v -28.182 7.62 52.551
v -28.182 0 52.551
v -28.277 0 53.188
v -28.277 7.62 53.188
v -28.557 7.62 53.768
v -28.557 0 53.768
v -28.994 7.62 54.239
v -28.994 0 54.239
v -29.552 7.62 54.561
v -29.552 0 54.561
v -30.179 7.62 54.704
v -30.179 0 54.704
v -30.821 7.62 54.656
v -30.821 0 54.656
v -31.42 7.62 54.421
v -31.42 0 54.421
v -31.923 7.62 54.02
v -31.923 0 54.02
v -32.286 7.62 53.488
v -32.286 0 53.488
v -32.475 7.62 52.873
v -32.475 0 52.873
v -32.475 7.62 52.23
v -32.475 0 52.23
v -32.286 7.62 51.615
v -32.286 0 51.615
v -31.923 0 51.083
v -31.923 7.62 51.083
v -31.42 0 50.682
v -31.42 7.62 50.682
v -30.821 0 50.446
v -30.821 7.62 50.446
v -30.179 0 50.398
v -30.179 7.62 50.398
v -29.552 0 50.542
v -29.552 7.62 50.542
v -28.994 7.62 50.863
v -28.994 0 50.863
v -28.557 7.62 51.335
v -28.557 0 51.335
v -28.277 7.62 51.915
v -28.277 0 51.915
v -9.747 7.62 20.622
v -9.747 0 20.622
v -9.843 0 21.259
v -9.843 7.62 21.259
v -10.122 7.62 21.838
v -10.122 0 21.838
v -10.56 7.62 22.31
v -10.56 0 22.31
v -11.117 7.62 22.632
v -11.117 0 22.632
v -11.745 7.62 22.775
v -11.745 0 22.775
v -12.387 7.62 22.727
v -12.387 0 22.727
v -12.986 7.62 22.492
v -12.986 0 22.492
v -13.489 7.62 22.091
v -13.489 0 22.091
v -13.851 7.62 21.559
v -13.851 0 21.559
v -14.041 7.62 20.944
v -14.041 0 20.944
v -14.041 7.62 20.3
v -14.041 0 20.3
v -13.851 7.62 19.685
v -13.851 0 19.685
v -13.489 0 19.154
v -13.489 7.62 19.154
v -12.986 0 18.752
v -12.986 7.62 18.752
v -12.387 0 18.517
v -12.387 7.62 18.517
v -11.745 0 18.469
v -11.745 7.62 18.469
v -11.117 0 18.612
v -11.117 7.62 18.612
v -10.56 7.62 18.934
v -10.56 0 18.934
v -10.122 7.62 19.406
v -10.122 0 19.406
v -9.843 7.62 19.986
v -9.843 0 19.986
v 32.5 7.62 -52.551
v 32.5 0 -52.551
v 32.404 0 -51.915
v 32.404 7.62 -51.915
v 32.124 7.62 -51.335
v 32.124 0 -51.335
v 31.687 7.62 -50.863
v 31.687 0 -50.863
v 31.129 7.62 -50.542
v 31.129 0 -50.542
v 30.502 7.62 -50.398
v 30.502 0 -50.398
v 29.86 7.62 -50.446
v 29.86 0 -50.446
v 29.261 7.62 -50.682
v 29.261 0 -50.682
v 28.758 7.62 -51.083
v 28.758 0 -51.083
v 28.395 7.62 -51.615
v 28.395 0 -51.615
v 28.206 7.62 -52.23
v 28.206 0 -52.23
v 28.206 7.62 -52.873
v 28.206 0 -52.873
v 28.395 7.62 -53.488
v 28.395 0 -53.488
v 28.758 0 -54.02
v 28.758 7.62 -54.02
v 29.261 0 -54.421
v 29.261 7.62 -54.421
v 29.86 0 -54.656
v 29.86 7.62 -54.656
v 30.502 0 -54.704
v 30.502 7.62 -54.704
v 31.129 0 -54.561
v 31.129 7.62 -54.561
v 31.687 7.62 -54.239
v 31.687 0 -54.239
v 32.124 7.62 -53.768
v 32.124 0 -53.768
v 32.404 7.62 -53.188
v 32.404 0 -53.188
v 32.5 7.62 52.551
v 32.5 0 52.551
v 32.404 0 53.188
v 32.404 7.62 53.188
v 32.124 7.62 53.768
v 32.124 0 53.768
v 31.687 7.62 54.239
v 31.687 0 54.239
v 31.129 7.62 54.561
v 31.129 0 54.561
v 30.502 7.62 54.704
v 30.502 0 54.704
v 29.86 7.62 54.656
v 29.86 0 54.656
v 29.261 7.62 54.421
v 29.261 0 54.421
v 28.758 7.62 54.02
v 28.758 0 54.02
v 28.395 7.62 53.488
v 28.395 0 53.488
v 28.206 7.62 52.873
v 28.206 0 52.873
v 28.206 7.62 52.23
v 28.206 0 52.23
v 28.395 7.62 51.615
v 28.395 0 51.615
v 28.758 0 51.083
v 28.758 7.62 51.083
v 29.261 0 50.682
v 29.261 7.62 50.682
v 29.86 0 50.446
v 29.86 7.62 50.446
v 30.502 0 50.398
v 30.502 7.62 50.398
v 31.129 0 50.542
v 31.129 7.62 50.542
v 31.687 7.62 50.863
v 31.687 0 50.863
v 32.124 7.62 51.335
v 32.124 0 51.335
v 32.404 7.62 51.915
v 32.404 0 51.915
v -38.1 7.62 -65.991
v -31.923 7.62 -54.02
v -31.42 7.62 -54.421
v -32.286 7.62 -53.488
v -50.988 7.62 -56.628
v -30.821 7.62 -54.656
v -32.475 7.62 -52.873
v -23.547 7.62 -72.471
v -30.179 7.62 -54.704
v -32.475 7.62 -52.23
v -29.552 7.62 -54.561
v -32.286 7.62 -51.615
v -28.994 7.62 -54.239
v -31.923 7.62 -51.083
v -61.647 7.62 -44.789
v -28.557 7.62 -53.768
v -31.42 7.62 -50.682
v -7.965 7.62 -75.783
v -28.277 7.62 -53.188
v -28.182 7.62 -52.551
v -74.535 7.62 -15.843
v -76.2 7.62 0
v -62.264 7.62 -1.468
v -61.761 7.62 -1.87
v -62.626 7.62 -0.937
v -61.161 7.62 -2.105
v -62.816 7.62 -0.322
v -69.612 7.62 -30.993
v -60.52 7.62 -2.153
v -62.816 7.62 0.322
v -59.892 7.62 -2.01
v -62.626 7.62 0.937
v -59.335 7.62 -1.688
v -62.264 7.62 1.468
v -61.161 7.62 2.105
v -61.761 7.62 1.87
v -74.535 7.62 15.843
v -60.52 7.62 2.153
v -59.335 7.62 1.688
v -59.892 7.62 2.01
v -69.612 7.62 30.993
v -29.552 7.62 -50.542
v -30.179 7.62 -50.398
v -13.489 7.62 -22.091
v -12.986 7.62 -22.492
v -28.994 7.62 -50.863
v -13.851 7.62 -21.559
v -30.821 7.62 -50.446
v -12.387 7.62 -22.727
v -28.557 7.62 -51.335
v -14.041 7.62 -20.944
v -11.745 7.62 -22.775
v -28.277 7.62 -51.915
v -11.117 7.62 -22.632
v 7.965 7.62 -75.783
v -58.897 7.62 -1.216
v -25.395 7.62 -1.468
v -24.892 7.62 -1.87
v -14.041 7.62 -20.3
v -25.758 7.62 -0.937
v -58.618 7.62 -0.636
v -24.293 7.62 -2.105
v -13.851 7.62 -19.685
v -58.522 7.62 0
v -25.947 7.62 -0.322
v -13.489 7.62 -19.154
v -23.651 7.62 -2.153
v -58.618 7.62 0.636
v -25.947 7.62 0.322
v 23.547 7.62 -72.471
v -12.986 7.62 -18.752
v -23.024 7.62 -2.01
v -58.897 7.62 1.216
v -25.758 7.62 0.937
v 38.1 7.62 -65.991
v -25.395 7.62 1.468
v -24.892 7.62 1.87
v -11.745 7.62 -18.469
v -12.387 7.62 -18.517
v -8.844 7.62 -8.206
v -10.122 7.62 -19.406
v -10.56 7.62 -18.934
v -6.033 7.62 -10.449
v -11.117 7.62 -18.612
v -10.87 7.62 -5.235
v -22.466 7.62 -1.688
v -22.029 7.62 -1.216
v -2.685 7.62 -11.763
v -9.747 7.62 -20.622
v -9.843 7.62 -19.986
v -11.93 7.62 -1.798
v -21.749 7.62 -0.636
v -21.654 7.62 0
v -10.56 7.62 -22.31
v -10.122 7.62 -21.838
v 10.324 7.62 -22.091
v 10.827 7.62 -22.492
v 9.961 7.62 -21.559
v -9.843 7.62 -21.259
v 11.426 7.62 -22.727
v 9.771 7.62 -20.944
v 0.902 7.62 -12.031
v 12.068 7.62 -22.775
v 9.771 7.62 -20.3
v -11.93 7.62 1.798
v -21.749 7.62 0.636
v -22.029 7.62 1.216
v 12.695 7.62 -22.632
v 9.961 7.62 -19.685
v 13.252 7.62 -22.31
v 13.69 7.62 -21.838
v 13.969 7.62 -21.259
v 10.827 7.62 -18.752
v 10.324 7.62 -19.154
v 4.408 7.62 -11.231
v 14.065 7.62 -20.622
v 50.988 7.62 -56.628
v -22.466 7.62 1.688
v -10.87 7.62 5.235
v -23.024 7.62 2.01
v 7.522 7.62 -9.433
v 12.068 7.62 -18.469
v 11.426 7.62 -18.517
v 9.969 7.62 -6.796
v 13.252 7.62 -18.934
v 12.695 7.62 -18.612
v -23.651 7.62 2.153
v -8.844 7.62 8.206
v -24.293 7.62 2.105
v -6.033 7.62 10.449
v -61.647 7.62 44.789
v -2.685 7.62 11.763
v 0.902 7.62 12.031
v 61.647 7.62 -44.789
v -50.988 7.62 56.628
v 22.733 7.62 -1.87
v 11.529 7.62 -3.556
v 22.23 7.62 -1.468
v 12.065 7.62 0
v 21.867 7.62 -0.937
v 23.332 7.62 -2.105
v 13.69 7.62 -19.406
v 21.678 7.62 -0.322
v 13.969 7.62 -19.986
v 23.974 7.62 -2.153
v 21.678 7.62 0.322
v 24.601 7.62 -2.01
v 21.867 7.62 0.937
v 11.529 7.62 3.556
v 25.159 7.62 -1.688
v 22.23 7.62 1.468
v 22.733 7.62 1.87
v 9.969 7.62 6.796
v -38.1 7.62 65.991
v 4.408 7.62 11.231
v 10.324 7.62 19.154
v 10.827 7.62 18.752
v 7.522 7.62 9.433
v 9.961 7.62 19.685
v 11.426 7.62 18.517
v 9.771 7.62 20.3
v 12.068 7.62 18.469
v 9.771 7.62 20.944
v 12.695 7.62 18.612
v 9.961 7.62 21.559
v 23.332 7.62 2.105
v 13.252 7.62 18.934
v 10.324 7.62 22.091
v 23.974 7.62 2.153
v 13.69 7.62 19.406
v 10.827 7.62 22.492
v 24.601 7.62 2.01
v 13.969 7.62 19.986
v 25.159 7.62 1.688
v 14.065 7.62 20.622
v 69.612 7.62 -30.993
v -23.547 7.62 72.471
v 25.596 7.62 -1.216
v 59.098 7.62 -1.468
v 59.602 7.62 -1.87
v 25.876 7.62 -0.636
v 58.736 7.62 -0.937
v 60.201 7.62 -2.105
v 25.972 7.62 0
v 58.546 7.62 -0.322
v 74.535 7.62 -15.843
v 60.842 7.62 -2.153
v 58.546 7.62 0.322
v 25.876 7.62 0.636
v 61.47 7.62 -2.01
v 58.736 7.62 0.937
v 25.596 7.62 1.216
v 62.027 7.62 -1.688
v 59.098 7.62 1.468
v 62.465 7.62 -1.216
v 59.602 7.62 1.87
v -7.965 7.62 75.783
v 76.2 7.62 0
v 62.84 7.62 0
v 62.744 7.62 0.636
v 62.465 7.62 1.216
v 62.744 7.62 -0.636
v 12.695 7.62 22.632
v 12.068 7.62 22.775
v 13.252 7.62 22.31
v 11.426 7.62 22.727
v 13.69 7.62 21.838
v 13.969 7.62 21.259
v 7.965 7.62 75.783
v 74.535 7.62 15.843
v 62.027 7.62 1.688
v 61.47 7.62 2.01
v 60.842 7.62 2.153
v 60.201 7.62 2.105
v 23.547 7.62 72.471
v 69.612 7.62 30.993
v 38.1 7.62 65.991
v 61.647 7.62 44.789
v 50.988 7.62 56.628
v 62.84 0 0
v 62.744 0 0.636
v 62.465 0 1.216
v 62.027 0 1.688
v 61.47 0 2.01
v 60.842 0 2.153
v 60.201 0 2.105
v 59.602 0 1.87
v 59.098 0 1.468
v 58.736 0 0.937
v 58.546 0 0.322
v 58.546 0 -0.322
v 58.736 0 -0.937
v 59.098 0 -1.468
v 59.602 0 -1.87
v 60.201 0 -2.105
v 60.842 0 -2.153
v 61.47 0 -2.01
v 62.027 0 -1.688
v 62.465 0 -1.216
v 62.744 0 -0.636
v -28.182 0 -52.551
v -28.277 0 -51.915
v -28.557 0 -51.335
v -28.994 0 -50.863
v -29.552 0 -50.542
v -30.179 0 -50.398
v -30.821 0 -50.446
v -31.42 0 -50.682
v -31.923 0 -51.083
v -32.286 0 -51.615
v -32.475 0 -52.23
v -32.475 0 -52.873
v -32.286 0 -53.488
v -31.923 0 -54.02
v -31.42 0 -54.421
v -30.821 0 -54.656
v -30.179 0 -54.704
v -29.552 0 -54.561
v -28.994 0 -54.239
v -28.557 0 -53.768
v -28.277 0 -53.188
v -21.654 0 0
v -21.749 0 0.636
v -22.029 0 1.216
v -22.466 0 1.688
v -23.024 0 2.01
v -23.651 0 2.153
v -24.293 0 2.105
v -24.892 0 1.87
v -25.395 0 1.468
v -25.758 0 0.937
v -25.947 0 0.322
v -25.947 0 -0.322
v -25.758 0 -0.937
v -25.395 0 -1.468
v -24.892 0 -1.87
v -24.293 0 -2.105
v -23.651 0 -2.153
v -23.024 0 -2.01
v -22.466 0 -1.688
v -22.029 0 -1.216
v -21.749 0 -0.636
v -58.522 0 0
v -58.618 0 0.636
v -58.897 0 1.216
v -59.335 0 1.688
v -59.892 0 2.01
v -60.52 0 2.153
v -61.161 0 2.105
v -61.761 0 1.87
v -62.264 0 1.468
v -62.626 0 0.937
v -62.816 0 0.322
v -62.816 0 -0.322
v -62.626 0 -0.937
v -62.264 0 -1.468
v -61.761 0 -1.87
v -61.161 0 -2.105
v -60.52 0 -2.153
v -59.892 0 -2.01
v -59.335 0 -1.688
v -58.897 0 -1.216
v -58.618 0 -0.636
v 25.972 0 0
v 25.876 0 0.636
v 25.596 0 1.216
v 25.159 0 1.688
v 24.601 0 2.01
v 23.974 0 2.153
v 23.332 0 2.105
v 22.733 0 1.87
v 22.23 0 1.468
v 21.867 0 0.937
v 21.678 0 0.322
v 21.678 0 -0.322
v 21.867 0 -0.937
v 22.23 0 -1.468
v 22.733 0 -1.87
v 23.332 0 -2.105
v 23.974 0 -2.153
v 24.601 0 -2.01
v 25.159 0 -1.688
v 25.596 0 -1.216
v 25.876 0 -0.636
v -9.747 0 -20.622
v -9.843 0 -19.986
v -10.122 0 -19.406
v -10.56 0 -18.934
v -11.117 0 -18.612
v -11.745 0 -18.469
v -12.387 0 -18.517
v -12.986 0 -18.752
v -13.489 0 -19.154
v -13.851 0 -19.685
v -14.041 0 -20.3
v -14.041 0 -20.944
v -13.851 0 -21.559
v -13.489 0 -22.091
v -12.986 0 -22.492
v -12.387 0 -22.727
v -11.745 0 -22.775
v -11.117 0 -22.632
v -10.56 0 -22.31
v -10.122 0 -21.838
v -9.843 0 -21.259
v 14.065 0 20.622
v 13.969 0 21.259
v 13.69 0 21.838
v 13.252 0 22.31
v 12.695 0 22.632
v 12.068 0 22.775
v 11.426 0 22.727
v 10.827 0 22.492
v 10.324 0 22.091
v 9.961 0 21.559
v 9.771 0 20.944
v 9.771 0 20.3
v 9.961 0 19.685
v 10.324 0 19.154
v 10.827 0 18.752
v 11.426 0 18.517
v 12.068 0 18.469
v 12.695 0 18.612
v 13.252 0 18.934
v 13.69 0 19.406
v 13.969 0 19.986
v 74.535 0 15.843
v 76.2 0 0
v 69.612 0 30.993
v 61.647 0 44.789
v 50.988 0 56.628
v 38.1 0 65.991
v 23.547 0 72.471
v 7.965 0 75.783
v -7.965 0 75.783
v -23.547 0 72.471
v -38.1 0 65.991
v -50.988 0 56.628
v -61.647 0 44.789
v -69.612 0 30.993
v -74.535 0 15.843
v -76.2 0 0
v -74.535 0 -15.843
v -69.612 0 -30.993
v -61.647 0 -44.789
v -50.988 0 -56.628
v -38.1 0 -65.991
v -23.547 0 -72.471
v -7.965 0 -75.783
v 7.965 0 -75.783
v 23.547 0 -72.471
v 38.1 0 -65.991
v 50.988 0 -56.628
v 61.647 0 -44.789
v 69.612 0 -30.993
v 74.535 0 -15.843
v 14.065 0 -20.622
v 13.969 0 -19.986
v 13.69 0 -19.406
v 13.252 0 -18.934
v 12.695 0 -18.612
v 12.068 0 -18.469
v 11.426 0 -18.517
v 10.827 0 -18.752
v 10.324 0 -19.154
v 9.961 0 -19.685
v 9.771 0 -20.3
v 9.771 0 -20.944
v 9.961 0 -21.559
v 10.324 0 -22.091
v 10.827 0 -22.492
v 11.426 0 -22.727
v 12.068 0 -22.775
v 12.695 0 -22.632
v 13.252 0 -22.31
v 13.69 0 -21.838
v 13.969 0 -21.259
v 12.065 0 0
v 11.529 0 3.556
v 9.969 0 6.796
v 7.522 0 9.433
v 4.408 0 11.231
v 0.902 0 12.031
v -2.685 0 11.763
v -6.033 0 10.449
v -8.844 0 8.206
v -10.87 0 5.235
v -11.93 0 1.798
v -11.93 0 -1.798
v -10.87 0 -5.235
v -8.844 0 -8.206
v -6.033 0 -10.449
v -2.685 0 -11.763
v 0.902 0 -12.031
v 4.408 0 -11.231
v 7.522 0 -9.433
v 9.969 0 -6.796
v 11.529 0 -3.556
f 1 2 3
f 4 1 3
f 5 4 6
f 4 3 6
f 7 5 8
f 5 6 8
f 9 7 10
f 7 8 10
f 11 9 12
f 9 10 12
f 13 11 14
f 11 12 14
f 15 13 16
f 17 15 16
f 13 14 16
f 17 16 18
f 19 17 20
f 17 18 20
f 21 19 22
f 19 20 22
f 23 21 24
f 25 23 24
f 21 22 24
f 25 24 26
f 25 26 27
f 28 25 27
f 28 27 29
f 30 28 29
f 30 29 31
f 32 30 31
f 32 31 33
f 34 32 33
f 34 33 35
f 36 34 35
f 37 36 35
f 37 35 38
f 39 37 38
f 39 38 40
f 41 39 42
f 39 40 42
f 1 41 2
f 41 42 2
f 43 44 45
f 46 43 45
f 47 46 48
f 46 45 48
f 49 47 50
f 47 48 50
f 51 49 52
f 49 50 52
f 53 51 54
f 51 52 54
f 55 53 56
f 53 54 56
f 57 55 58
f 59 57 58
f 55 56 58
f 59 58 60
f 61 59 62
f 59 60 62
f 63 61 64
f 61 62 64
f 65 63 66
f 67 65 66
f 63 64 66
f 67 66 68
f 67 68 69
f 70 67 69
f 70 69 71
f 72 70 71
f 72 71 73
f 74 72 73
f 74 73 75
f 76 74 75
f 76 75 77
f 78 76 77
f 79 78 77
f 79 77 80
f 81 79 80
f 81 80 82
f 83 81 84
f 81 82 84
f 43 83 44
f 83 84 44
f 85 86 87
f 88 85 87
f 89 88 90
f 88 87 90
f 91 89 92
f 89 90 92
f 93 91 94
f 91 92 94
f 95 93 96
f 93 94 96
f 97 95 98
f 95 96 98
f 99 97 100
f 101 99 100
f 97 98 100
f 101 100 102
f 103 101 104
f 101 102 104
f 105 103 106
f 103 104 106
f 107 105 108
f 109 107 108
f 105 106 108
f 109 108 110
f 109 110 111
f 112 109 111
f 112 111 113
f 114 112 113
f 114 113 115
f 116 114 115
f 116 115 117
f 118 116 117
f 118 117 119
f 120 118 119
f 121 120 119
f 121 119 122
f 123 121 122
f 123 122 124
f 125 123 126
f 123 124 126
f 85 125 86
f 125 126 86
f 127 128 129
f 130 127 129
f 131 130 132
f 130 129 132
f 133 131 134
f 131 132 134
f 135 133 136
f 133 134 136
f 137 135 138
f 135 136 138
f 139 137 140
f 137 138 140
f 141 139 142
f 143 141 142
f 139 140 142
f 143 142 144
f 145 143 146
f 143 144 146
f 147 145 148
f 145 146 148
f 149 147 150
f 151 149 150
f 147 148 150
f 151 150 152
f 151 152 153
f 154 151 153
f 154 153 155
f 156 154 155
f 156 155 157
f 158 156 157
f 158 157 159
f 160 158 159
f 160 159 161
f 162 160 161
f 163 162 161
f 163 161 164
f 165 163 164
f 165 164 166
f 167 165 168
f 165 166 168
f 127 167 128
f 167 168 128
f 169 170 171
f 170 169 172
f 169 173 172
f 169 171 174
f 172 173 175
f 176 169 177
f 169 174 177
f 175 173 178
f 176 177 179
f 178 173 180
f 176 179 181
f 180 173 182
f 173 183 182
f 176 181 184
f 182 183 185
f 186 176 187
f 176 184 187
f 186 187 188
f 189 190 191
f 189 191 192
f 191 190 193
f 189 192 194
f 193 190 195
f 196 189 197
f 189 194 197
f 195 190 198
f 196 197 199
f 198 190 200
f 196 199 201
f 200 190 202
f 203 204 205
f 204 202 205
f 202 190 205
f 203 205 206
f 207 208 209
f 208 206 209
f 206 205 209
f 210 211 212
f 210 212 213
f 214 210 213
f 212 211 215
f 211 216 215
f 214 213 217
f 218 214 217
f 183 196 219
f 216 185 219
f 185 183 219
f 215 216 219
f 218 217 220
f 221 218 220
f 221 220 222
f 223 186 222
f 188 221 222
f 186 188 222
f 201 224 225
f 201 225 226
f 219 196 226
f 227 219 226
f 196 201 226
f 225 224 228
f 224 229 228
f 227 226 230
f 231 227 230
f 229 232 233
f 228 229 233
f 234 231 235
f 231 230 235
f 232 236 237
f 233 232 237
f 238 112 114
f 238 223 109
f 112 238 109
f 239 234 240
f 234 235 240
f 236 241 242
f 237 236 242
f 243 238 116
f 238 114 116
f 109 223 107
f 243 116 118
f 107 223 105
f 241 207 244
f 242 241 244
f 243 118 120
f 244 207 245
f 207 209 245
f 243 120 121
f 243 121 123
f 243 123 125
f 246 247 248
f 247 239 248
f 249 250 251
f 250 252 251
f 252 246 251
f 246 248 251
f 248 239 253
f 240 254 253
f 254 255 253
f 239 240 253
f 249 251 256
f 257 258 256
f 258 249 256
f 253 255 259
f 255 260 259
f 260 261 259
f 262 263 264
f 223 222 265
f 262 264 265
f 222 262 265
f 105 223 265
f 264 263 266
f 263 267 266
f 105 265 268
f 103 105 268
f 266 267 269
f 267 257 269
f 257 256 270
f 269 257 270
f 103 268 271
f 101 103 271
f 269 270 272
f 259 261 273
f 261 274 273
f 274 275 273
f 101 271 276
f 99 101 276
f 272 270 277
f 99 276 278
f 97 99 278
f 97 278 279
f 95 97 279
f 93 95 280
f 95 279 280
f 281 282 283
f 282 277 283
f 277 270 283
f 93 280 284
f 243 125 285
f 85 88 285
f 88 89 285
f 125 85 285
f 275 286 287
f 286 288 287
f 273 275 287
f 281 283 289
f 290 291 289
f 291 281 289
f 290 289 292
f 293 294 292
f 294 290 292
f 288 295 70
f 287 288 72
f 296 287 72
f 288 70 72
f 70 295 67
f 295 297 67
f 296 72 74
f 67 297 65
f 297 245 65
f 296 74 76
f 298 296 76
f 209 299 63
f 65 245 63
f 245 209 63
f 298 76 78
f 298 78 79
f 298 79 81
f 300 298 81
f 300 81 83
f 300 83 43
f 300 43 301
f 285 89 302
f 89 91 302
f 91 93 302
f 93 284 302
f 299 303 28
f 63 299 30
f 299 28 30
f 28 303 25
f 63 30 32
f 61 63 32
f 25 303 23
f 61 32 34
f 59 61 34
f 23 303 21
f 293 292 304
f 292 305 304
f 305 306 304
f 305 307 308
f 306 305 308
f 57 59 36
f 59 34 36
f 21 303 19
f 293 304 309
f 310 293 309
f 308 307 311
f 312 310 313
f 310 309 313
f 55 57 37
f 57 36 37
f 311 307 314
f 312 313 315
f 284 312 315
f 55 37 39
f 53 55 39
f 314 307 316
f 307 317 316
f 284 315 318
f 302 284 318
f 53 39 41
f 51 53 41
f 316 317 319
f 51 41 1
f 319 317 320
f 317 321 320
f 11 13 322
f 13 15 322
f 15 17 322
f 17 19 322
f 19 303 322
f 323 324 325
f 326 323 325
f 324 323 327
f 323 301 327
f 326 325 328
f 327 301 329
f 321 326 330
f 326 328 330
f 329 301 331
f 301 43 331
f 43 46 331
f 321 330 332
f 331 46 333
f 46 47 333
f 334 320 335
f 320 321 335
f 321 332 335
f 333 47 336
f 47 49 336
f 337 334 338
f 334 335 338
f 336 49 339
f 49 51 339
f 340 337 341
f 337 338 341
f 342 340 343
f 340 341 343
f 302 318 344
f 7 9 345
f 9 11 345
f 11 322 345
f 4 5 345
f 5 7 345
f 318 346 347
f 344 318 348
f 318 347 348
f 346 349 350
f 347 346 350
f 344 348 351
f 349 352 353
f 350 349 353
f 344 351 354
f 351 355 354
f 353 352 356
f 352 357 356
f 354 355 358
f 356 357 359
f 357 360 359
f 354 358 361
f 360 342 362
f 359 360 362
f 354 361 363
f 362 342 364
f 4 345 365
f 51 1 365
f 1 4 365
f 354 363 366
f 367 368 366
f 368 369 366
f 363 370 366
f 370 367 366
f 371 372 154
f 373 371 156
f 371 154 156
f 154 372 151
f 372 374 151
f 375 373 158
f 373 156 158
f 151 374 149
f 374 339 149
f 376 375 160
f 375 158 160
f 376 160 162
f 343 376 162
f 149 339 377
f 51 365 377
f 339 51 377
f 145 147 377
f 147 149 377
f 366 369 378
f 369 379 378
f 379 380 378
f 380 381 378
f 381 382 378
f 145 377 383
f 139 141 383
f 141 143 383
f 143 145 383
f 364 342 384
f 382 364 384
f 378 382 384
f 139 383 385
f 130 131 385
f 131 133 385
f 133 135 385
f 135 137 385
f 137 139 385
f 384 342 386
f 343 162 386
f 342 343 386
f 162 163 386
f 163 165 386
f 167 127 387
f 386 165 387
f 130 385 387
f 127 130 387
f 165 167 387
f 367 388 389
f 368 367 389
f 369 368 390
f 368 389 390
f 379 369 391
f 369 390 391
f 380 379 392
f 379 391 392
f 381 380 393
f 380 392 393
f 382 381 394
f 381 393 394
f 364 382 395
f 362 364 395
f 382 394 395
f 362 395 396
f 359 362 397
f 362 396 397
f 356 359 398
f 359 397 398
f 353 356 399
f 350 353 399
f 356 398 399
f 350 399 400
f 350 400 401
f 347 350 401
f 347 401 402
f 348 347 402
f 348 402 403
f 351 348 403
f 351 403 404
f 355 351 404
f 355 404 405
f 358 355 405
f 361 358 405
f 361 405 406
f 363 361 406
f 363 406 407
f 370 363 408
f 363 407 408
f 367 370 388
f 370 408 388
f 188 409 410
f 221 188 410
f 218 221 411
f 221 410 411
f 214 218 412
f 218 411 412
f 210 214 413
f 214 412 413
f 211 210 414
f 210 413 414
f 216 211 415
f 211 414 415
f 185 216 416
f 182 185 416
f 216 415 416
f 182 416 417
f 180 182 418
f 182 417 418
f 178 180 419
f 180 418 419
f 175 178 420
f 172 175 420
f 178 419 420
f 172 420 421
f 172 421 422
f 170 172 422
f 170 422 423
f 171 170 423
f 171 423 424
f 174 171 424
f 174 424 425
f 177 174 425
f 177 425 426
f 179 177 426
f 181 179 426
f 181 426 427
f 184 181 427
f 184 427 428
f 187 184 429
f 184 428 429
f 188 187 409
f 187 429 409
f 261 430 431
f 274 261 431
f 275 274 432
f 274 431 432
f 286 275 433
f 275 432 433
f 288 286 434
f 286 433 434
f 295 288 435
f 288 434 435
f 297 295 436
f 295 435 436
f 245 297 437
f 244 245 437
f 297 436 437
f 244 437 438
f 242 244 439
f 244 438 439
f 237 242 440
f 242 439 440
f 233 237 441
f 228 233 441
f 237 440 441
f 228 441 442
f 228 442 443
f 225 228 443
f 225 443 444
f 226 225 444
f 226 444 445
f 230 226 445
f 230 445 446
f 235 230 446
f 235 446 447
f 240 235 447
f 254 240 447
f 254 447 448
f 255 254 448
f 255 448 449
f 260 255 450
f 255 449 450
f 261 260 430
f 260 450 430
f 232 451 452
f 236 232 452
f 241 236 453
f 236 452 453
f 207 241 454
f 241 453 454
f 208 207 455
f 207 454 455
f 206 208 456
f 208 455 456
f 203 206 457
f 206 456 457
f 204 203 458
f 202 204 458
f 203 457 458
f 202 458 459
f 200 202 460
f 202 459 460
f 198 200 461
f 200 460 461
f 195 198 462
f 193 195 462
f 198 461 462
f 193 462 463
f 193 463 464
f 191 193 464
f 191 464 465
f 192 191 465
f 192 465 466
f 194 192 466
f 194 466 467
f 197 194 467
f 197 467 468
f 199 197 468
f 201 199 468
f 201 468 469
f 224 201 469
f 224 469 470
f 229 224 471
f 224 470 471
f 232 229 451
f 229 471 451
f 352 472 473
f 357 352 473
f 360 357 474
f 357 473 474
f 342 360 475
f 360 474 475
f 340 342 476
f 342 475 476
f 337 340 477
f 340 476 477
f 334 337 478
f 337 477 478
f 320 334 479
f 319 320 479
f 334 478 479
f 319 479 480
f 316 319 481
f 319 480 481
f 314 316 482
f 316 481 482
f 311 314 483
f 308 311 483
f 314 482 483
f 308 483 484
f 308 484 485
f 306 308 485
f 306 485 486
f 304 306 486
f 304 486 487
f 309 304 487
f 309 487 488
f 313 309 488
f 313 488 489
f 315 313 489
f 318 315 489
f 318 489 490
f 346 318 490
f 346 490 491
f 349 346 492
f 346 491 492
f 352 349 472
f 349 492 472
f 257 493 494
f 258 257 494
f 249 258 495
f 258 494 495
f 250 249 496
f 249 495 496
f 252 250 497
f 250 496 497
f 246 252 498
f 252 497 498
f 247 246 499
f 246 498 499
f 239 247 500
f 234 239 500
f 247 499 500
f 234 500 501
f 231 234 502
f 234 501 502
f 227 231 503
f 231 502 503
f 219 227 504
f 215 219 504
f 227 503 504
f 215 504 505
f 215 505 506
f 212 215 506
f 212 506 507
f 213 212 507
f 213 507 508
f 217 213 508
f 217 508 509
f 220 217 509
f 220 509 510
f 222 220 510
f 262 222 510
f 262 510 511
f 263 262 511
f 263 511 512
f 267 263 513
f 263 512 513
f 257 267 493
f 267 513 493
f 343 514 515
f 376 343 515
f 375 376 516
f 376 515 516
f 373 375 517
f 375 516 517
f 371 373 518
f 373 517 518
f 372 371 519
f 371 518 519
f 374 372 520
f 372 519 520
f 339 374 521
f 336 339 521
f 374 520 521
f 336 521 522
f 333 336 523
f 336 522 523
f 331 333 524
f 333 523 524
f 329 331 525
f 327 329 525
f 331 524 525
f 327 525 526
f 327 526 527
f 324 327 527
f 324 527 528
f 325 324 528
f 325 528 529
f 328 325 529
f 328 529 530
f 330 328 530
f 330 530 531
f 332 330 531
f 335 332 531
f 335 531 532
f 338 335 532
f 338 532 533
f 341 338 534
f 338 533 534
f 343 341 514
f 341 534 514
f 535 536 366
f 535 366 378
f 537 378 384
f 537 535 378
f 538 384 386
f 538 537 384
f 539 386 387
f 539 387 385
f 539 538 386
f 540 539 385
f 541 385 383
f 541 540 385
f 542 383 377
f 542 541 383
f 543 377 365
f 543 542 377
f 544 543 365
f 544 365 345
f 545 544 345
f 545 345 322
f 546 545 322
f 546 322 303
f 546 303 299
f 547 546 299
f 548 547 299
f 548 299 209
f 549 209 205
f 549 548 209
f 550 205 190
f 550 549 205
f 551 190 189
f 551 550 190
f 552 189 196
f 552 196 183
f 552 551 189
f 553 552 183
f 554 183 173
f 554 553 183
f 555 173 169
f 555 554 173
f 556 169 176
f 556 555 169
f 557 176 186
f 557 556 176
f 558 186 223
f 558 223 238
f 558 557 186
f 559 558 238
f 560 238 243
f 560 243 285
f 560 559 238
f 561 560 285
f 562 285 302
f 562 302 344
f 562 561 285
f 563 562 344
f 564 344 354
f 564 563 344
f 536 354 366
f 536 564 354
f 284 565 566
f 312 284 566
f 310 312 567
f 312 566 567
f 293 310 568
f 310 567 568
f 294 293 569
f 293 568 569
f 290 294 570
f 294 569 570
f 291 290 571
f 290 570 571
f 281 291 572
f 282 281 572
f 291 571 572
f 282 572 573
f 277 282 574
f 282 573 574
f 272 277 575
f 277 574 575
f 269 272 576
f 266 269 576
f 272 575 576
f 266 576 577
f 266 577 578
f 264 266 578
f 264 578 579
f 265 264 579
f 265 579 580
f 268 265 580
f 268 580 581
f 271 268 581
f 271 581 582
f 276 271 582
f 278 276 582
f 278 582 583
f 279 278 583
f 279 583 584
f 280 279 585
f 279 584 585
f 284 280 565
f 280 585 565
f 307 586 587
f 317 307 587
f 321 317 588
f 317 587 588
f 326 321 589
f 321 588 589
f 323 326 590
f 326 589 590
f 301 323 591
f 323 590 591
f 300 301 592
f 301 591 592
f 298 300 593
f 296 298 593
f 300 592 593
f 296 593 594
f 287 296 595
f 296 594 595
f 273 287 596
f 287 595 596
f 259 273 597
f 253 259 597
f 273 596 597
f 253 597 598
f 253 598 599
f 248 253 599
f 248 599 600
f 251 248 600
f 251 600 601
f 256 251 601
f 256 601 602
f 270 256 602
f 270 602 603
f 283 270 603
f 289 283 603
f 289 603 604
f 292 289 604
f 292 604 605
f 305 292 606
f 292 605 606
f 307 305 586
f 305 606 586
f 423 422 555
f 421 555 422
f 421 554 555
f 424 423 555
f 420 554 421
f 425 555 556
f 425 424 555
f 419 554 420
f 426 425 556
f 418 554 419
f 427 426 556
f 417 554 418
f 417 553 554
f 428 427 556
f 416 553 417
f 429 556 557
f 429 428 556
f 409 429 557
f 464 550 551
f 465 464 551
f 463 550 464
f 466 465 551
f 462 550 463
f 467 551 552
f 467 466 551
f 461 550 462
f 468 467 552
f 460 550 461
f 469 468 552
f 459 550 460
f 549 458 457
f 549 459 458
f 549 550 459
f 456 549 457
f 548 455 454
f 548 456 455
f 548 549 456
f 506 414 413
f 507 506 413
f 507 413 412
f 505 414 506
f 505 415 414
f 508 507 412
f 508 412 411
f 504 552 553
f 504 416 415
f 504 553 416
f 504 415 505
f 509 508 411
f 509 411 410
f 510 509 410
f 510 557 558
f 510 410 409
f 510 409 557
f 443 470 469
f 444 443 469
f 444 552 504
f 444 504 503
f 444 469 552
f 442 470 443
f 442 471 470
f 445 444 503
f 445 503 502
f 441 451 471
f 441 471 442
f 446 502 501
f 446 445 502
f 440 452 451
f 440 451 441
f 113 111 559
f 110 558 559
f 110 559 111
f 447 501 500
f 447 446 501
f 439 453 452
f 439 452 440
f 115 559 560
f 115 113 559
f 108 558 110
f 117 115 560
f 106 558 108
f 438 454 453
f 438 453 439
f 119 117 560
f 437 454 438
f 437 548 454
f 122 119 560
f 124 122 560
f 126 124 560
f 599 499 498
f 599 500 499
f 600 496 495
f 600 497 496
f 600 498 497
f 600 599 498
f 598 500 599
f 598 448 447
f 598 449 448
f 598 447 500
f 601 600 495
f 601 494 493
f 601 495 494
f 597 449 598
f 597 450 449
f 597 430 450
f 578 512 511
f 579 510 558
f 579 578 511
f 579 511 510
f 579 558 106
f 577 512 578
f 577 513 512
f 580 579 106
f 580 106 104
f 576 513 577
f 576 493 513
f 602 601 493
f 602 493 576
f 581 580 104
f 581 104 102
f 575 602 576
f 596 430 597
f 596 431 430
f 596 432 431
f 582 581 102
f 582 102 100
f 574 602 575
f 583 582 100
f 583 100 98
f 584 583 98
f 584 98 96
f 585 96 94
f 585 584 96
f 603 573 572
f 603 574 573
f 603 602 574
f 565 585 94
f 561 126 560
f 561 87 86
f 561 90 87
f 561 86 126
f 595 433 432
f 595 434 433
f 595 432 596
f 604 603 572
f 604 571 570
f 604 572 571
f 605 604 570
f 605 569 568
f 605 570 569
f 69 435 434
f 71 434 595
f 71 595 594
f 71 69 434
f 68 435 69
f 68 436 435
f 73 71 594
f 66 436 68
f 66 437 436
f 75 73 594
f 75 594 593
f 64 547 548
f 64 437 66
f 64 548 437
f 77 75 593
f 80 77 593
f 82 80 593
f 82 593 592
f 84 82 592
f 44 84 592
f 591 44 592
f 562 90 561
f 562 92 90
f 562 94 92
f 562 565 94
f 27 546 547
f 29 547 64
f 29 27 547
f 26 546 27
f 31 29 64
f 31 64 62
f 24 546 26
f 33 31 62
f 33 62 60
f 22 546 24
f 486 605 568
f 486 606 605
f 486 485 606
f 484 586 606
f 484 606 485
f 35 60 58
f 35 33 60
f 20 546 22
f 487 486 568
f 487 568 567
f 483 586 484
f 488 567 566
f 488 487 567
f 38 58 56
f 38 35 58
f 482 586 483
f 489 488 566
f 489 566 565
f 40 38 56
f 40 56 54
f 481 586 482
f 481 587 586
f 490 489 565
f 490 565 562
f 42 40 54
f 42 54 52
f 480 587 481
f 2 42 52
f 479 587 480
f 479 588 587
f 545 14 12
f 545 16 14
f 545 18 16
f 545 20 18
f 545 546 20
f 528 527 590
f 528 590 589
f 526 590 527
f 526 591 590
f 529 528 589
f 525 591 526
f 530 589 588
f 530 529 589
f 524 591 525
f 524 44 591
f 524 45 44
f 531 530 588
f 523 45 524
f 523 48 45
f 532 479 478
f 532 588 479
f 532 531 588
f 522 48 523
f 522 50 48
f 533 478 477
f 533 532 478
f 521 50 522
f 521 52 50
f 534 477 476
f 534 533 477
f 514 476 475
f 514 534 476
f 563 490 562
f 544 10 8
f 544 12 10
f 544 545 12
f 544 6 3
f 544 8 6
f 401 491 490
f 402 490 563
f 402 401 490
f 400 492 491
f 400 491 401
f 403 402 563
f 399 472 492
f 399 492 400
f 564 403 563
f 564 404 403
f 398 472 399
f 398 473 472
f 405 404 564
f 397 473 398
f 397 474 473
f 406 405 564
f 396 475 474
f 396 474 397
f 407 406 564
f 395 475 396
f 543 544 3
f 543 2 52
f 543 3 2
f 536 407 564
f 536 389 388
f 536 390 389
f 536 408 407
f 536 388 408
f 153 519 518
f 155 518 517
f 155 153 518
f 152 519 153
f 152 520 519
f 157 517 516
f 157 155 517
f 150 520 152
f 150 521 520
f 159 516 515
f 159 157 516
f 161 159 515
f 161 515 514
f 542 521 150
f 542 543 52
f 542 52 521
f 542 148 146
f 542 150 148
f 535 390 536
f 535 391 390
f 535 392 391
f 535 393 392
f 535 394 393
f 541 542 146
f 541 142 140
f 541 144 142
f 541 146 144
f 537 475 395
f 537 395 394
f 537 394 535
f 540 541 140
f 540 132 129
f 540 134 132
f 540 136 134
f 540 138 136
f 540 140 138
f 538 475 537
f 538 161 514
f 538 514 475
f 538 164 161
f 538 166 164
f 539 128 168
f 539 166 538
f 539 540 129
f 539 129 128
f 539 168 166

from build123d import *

# Parameters (mm, degrees)
F0_R     = 76.2
F0_R_2   = 2.159
F0_R_3   = 12.065
F1_DEPTH = 7.62


with BuildPart() as f1:
    # F0 (on Front) → F1 (new body)
    with BuildSketch(Plane.XZ):
        Circle(F0_R)
        with Locations((-30.340516, -52.551315)):
            Circle(F0_R_2, mode=Mode.SUBTRACT)
        with Locations((-11.90625, -20.62223)):
            Circle(F0_R_2, mode=Mode.SUBTRACT)
        with Locations((30.340516, -52.551315)):
            Circle(F0_R_2, mode=Mode.SUBTRACT)
        with Locations((11.90625, -20.62223)):
            Circle(F0_R_2, mode=Mode.SUBTRACT)
        with Locations((-60.681032, 0)):
            Circle(F0_R_2, mode=Mode.SUBTRACT)
        with Locations((-23.8125, 0)):
            Circle(F0_R_2, mode=Mode.SUBTRACT)
        with Locations((-11.90625, 20.62223)):
            Circle(F0_R_2, mode=Mode.SUBTRACT)
        with Locations((-30.340516, 52.551315)):
            Circle(F0_R_2, mode=Mode.SUBTRACT)
        Circle(F0_R_3, mode=Mode.SUBTRACT)
        with Locations((23.8125, 0)):
            Circle(F0_R_2, mode=Mode.SUBTRACT)
        with Locations((11.90625, 20.62223)):
            Circle(F0_R_2, mode=Mode.SUBTRACT)
        with Locations((60.681032, 0)):
            Circle(F0_R_2, mode=Mode.SUBTRACT)
        with Locations((30.340516, 52.551315)):
            Circle(F0_R_2, mode=Mode.SUBTRACT)
    extrude(amount=-F1_DEPTH)


solid = f1.part
